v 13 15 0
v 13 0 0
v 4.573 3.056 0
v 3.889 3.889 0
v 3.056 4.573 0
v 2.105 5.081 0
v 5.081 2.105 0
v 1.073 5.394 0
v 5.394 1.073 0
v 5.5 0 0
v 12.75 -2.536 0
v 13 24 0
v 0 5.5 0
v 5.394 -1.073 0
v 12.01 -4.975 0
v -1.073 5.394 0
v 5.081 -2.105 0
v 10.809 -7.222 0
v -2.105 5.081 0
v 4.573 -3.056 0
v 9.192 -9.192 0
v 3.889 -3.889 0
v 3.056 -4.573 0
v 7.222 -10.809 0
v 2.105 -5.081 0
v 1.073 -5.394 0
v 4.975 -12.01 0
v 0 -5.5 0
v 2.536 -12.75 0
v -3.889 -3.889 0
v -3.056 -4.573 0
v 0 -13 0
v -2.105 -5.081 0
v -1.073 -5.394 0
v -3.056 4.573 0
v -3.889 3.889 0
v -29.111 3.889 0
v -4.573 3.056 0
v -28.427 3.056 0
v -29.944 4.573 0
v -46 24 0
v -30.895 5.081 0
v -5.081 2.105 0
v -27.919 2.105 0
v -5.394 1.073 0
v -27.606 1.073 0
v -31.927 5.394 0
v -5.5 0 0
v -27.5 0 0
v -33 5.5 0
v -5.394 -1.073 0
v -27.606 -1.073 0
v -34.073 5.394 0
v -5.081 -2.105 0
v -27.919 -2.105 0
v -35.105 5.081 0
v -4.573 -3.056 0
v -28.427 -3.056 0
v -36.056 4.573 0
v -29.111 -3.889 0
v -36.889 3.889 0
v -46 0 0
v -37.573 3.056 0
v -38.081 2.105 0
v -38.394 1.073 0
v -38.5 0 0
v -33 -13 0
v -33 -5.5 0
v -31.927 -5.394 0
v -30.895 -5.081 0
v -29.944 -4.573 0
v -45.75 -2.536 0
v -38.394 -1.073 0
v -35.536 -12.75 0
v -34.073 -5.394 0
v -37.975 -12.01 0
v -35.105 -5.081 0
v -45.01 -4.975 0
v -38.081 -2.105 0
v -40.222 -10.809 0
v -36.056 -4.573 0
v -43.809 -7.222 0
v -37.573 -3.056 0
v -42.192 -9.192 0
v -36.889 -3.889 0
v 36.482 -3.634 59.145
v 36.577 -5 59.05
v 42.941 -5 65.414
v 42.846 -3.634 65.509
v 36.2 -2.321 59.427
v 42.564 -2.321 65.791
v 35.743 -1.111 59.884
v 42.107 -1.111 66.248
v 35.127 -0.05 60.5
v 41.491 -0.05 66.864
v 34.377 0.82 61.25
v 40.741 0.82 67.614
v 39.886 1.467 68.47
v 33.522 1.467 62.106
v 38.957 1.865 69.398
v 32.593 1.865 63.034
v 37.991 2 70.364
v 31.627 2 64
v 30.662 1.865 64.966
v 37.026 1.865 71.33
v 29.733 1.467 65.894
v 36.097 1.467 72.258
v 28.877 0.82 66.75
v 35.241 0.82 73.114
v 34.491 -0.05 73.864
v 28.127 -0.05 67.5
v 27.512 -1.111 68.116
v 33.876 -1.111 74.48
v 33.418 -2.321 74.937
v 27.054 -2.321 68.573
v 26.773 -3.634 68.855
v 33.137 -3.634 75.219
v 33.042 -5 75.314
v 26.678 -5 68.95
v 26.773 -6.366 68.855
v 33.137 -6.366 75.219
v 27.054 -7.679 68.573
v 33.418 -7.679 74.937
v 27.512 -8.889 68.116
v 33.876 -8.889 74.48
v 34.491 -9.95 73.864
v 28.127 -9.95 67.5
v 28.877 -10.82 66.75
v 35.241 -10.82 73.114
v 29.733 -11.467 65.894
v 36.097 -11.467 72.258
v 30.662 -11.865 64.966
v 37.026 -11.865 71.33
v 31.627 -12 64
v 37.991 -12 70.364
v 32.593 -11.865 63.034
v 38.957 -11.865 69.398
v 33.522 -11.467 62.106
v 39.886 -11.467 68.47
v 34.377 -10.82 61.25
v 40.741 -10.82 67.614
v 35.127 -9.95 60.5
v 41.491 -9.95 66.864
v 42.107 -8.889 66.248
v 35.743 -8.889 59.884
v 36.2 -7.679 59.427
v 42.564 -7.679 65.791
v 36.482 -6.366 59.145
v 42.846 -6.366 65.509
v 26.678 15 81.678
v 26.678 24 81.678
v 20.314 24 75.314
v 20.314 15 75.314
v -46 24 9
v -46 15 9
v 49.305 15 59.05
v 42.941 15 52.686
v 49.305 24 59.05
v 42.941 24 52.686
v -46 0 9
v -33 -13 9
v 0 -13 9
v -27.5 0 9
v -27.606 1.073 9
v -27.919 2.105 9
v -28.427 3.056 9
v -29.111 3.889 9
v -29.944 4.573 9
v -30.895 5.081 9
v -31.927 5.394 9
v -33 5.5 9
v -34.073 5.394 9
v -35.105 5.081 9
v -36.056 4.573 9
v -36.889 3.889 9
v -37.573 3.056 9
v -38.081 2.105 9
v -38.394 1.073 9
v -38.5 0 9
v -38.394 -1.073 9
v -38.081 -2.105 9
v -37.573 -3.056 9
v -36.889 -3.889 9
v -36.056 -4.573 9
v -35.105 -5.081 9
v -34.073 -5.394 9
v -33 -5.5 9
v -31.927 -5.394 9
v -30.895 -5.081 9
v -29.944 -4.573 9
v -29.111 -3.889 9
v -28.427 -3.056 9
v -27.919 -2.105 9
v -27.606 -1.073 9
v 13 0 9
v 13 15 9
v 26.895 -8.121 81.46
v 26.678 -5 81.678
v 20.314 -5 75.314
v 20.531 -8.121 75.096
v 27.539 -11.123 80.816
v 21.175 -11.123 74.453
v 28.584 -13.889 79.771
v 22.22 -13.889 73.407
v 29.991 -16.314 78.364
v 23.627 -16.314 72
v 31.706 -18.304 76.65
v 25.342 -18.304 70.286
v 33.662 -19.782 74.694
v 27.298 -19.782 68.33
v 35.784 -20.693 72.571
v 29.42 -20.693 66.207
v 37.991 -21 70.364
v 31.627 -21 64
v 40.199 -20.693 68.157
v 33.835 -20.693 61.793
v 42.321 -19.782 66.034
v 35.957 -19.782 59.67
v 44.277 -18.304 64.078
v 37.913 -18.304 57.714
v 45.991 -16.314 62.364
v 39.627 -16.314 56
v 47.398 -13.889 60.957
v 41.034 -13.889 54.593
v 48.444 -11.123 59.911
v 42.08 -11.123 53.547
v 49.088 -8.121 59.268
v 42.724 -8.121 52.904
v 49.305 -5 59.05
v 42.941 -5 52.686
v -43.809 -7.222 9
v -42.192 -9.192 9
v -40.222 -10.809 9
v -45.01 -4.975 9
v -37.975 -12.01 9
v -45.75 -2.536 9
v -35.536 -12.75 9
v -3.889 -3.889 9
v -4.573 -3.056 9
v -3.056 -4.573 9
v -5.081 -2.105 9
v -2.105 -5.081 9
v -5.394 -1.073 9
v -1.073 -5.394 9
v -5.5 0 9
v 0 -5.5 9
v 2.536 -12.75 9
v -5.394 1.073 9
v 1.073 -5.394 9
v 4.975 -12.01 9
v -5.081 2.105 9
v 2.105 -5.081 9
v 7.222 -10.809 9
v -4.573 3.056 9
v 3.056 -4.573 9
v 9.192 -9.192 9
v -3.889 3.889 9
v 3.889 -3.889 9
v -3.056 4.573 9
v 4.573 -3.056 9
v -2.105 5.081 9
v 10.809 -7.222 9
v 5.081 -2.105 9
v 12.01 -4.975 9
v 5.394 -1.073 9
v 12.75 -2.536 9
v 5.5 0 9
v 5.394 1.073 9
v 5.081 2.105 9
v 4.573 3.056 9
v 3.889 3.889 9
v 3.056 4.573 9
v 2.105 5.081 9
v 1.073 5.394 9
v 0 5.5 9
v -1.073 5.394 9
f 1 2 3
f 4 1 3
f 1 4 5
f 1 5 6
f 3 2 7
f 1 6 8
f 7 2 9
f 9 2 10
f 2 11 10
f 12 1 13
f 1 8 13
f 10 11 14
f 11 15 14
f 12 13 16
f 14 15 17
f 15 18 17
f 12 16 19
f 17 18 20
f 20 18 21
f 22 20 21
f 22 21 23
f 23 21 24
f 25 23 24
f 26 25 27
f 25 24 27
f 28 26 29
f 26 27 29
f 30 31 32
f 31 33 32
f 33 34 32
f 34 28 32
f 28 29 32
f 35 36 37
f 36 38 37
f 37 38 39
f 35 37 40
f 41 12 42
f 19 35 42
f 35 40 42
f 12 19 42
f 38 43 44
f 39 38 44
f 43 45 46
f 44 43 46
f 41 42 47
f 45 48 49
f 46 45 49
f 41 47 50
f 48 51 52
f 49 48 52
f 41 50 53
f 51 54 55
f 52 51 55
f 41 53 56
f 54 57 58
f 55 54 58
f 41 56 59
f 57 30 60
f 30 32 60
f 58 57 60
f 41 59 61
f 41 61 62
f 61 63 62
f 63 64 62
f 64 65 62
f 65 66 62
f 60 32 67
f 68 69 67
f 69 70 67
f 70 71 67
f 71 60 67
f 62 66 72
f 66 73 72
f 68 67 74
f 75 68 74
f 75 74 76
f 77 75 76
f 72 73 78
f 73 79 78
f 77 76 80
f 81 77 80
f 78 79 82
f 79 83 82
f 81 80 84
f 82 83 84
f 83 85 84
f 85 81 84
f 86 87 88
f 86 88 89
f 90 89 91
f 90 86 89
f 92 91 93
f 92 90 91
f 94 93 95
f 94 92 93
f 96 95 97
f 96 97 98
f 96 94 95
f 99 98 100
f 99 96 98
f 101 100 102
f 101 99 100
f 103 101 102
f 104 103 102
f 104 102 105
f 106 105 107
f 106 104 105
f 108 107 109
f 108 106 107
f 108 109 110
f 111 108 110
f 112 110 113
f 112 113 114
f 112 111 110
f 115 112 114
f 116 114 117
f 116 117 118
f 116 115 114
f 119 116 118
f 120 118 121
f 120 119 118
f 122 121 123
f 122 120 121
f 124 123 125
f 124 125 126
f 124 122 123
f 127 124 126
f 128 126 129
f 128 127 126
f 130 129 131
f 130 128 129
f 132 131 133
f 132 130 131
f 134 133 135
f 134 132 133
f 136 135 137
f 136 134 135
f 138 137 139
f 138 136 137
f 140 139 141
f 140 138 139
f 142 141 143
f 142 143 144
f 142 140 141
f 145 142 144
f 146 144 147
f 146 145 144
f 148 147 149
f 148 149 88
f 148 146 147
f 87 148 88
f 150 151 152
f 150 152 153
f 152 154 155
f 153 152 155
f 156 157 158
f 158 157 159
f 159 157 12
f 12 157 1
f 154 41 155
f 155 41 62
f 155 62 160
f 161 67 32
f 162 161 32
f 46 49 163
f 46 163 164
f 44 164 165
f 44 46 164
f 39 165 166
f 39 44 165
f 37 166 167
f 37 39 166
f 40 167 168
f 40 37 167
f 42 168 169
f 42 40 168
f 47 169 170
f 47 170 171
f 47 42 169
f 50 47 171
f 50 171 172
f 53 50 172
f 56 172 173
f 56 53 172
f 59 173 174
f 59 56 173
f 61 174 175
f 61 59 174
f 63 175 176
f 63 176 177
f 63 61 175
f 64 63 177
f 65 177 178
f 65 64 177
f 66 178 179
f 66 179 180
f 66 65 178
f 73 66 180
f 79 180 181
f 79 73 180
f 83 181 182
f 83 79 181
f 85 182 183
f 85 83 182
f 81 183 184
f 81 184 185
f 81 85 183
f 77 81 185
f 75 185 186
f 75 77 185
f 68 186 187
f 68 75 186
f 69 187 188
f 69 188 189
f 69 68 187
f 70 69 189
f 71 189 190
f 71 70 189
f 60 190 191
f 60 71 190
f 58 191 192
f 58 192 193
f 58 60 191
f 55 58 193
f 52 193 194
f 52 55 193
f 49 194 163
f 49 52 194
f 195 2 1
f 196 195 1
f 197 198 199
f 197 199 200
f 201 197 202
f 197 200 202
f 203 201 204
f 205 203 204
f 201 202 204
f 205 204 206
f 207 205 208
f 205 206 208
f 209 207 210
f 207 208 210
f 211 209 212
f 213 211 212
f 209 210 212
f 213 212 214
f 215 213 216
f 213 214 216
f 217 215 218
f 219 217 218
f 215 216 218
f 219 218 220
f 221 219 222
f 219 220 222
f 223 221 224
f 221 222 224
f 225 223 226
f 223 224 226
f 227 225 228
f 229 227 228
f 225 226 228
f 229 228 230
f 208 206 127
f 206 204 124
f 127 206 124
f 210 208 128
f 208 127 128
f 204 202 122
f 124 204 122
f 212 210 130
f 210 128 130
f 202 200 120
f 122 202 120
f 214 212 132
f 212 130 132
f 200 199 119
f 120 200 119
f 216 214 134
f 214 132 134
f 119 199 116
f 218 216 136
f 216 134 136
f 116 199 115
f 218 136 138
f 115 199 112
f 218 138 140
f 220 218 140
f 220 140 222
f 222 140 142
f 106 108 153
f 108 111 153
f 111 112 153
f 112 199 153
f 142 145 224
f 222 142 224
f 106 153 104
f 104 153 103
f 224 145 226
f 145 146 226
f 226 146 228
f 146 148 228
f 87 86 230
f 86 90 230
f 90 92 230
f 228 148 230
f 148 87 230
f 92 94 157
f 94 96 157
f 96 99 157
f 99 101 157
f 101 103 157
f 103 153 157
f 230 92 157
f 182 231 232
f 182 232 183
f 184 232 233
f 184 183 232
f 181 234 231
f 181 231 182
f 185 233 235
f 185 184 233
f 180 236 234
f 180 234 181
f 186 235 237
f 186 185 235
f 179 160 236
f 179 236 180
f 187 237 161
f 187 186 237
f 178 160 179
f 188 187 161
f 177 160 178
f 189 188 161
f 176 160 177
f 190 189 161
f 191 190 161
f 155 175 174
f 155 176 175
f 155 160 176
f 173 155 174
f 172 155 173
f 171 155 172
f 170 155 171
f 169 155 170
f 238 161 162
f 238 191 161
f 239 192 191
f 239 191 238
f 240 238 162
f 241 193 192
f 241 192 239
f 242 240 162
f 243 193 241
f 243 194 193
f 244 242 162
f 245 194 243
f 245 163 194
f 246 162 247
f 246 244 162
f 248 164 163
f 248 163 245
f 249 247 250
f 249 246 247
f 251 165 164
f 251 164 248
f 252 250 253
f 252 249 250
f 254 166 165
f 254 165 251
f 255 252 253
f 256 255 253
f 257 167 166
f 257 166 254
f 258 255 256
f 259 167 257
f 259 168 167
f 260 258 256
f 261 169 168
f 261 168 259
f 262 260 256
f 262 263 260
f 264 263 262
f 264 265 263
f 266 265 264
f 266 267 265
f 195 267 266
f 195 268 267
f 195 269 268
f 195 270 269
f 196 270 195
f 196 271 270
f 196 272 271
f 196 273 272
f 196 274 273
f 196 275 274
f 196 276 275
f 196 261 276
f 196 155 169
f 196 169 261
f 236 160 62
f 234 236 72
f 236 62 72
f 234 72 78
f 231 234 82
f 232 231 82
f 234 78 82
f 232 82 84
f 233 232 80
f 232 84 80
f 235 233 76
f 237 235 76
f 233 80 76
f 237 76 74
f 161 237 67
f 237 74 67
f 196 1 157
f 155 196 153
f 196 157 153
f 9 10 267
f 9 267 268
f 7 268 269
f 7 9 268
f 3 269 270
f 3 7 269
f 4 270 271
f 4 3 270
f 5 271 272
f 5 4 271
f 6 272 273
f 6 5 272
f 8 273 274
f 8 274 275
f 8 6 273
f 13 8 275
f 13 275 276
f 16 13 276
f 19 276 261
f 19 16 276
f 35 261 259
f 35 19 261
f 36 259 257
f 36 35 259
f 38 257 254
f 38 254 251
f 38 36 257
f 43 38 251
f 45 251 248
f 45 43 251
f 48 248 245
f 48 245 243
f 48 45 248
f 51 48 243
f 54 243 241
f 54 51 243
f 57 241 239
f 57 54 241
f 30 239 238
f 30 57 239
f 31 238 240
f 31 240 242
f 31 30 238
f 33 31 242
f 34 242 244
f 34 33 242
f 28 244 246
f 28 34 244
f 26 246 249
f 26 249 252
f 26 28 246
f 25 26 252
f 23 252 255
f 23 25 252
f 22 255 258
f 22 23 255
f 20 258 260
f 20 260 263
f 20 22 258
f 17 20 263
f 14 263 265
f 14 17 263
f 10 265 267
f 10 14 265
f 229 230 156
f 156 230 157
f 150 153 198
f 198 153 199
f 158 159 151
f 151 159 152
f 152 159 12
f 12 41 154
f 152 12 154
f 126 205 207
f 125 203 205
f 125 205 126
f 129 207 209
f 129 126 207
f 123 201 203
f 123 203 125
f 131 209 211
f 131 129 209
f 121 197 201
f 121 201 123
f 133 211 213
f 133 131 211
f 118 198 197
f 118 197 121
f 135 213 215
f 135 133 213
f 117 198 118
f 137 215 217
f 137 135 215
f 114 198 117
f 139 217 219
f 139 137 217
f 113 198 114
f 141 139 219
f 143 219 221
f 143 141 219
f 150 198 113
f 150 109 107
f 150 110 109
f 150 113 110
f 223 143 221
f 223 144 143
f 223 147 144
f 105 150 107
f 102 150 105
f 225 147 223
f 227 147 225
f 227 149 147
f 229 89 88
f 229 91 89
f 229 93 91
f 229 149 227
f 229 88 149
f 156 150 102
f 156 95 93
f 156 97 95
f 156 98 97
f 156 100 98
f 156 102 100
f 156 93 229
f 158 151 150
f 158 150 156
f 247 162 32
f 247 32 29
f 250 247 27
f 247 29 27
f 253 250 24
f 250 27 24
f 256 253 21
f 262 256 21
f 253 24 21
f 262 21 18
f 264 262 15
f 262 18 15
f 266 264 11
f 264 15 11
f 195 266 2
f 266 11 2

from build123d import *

# Parameters (mm, degrees)
F0_R     = 5.5
F1_DEPTH = 9
F3_DEPTH = 9
F4_R     = 7
F5_DEPTH = 9


with BuildPart() as f1:
    # F0 (on Top) → F1 (new body)
    with BuildSketch(Plane.XY):
        with BuildLine():
            Line((-46, 15), (-46, 0))
            ThreePointArc((-46, 0), (-42.192388, -9.192388), (-33, -13))
            Line((-33, -13), (0, -13))
            ThreePointArc((0, -13), (9.192388, -9.192388), (13, 0))
            Line((13, 0), (13, 15))
            Line((13, 15), (-46, 15))
        make_face()
        with Locations((-33, 0)):
            Circle(F0_R, mode=Mode.SUBTRACT)
        Circle(F0_R, mode=Mode.SUBTRACT)
    extrude(amount=F1_DEPTH)

    # F2 (on face) → F3 (join)
    with BuildSketch(Plane(origin=(0, 15, 0), x_dir=(-1, 0, 0), z_dir=(0, 1, 0))):
        Polygon((46, 0), (46, 9), (-20.313708, 75.313708), (-42.941125, 52.686292), (-13, 0), align=None)
    extrude(amount=F3_DEPTH)

    # F4 (on face) → F5 (join)
    with BuildSketch(Plane(origin=(47.813708, 0, 47.813708), x_dir=(0.707107, 0, -0.707107), z_dir=(0.707107, 0, 0.707107))):
        with BuildLine():
            Line((-6.890873, 15), (-6.890873, 24))
            Line((-6.890873, 24), (-38.890873, 24))
            Line((-38.890873, 24), (-38.890873, 15))
            Line((-38.890873, 15), (-38.890875, -5))
            ThreePointArc((-38.890875, -5), (-22.890875, -21), (-6.890875, -5))
            Line((-6.890875, -5), (-6.890873, 15))
        make_face()
        with Locations((-22.890875, -5)):
            Circle(F4_R, mode=Mode.SUBTRACT)
    extrude(amount=F5_DEPTH)


solid = f1.part
